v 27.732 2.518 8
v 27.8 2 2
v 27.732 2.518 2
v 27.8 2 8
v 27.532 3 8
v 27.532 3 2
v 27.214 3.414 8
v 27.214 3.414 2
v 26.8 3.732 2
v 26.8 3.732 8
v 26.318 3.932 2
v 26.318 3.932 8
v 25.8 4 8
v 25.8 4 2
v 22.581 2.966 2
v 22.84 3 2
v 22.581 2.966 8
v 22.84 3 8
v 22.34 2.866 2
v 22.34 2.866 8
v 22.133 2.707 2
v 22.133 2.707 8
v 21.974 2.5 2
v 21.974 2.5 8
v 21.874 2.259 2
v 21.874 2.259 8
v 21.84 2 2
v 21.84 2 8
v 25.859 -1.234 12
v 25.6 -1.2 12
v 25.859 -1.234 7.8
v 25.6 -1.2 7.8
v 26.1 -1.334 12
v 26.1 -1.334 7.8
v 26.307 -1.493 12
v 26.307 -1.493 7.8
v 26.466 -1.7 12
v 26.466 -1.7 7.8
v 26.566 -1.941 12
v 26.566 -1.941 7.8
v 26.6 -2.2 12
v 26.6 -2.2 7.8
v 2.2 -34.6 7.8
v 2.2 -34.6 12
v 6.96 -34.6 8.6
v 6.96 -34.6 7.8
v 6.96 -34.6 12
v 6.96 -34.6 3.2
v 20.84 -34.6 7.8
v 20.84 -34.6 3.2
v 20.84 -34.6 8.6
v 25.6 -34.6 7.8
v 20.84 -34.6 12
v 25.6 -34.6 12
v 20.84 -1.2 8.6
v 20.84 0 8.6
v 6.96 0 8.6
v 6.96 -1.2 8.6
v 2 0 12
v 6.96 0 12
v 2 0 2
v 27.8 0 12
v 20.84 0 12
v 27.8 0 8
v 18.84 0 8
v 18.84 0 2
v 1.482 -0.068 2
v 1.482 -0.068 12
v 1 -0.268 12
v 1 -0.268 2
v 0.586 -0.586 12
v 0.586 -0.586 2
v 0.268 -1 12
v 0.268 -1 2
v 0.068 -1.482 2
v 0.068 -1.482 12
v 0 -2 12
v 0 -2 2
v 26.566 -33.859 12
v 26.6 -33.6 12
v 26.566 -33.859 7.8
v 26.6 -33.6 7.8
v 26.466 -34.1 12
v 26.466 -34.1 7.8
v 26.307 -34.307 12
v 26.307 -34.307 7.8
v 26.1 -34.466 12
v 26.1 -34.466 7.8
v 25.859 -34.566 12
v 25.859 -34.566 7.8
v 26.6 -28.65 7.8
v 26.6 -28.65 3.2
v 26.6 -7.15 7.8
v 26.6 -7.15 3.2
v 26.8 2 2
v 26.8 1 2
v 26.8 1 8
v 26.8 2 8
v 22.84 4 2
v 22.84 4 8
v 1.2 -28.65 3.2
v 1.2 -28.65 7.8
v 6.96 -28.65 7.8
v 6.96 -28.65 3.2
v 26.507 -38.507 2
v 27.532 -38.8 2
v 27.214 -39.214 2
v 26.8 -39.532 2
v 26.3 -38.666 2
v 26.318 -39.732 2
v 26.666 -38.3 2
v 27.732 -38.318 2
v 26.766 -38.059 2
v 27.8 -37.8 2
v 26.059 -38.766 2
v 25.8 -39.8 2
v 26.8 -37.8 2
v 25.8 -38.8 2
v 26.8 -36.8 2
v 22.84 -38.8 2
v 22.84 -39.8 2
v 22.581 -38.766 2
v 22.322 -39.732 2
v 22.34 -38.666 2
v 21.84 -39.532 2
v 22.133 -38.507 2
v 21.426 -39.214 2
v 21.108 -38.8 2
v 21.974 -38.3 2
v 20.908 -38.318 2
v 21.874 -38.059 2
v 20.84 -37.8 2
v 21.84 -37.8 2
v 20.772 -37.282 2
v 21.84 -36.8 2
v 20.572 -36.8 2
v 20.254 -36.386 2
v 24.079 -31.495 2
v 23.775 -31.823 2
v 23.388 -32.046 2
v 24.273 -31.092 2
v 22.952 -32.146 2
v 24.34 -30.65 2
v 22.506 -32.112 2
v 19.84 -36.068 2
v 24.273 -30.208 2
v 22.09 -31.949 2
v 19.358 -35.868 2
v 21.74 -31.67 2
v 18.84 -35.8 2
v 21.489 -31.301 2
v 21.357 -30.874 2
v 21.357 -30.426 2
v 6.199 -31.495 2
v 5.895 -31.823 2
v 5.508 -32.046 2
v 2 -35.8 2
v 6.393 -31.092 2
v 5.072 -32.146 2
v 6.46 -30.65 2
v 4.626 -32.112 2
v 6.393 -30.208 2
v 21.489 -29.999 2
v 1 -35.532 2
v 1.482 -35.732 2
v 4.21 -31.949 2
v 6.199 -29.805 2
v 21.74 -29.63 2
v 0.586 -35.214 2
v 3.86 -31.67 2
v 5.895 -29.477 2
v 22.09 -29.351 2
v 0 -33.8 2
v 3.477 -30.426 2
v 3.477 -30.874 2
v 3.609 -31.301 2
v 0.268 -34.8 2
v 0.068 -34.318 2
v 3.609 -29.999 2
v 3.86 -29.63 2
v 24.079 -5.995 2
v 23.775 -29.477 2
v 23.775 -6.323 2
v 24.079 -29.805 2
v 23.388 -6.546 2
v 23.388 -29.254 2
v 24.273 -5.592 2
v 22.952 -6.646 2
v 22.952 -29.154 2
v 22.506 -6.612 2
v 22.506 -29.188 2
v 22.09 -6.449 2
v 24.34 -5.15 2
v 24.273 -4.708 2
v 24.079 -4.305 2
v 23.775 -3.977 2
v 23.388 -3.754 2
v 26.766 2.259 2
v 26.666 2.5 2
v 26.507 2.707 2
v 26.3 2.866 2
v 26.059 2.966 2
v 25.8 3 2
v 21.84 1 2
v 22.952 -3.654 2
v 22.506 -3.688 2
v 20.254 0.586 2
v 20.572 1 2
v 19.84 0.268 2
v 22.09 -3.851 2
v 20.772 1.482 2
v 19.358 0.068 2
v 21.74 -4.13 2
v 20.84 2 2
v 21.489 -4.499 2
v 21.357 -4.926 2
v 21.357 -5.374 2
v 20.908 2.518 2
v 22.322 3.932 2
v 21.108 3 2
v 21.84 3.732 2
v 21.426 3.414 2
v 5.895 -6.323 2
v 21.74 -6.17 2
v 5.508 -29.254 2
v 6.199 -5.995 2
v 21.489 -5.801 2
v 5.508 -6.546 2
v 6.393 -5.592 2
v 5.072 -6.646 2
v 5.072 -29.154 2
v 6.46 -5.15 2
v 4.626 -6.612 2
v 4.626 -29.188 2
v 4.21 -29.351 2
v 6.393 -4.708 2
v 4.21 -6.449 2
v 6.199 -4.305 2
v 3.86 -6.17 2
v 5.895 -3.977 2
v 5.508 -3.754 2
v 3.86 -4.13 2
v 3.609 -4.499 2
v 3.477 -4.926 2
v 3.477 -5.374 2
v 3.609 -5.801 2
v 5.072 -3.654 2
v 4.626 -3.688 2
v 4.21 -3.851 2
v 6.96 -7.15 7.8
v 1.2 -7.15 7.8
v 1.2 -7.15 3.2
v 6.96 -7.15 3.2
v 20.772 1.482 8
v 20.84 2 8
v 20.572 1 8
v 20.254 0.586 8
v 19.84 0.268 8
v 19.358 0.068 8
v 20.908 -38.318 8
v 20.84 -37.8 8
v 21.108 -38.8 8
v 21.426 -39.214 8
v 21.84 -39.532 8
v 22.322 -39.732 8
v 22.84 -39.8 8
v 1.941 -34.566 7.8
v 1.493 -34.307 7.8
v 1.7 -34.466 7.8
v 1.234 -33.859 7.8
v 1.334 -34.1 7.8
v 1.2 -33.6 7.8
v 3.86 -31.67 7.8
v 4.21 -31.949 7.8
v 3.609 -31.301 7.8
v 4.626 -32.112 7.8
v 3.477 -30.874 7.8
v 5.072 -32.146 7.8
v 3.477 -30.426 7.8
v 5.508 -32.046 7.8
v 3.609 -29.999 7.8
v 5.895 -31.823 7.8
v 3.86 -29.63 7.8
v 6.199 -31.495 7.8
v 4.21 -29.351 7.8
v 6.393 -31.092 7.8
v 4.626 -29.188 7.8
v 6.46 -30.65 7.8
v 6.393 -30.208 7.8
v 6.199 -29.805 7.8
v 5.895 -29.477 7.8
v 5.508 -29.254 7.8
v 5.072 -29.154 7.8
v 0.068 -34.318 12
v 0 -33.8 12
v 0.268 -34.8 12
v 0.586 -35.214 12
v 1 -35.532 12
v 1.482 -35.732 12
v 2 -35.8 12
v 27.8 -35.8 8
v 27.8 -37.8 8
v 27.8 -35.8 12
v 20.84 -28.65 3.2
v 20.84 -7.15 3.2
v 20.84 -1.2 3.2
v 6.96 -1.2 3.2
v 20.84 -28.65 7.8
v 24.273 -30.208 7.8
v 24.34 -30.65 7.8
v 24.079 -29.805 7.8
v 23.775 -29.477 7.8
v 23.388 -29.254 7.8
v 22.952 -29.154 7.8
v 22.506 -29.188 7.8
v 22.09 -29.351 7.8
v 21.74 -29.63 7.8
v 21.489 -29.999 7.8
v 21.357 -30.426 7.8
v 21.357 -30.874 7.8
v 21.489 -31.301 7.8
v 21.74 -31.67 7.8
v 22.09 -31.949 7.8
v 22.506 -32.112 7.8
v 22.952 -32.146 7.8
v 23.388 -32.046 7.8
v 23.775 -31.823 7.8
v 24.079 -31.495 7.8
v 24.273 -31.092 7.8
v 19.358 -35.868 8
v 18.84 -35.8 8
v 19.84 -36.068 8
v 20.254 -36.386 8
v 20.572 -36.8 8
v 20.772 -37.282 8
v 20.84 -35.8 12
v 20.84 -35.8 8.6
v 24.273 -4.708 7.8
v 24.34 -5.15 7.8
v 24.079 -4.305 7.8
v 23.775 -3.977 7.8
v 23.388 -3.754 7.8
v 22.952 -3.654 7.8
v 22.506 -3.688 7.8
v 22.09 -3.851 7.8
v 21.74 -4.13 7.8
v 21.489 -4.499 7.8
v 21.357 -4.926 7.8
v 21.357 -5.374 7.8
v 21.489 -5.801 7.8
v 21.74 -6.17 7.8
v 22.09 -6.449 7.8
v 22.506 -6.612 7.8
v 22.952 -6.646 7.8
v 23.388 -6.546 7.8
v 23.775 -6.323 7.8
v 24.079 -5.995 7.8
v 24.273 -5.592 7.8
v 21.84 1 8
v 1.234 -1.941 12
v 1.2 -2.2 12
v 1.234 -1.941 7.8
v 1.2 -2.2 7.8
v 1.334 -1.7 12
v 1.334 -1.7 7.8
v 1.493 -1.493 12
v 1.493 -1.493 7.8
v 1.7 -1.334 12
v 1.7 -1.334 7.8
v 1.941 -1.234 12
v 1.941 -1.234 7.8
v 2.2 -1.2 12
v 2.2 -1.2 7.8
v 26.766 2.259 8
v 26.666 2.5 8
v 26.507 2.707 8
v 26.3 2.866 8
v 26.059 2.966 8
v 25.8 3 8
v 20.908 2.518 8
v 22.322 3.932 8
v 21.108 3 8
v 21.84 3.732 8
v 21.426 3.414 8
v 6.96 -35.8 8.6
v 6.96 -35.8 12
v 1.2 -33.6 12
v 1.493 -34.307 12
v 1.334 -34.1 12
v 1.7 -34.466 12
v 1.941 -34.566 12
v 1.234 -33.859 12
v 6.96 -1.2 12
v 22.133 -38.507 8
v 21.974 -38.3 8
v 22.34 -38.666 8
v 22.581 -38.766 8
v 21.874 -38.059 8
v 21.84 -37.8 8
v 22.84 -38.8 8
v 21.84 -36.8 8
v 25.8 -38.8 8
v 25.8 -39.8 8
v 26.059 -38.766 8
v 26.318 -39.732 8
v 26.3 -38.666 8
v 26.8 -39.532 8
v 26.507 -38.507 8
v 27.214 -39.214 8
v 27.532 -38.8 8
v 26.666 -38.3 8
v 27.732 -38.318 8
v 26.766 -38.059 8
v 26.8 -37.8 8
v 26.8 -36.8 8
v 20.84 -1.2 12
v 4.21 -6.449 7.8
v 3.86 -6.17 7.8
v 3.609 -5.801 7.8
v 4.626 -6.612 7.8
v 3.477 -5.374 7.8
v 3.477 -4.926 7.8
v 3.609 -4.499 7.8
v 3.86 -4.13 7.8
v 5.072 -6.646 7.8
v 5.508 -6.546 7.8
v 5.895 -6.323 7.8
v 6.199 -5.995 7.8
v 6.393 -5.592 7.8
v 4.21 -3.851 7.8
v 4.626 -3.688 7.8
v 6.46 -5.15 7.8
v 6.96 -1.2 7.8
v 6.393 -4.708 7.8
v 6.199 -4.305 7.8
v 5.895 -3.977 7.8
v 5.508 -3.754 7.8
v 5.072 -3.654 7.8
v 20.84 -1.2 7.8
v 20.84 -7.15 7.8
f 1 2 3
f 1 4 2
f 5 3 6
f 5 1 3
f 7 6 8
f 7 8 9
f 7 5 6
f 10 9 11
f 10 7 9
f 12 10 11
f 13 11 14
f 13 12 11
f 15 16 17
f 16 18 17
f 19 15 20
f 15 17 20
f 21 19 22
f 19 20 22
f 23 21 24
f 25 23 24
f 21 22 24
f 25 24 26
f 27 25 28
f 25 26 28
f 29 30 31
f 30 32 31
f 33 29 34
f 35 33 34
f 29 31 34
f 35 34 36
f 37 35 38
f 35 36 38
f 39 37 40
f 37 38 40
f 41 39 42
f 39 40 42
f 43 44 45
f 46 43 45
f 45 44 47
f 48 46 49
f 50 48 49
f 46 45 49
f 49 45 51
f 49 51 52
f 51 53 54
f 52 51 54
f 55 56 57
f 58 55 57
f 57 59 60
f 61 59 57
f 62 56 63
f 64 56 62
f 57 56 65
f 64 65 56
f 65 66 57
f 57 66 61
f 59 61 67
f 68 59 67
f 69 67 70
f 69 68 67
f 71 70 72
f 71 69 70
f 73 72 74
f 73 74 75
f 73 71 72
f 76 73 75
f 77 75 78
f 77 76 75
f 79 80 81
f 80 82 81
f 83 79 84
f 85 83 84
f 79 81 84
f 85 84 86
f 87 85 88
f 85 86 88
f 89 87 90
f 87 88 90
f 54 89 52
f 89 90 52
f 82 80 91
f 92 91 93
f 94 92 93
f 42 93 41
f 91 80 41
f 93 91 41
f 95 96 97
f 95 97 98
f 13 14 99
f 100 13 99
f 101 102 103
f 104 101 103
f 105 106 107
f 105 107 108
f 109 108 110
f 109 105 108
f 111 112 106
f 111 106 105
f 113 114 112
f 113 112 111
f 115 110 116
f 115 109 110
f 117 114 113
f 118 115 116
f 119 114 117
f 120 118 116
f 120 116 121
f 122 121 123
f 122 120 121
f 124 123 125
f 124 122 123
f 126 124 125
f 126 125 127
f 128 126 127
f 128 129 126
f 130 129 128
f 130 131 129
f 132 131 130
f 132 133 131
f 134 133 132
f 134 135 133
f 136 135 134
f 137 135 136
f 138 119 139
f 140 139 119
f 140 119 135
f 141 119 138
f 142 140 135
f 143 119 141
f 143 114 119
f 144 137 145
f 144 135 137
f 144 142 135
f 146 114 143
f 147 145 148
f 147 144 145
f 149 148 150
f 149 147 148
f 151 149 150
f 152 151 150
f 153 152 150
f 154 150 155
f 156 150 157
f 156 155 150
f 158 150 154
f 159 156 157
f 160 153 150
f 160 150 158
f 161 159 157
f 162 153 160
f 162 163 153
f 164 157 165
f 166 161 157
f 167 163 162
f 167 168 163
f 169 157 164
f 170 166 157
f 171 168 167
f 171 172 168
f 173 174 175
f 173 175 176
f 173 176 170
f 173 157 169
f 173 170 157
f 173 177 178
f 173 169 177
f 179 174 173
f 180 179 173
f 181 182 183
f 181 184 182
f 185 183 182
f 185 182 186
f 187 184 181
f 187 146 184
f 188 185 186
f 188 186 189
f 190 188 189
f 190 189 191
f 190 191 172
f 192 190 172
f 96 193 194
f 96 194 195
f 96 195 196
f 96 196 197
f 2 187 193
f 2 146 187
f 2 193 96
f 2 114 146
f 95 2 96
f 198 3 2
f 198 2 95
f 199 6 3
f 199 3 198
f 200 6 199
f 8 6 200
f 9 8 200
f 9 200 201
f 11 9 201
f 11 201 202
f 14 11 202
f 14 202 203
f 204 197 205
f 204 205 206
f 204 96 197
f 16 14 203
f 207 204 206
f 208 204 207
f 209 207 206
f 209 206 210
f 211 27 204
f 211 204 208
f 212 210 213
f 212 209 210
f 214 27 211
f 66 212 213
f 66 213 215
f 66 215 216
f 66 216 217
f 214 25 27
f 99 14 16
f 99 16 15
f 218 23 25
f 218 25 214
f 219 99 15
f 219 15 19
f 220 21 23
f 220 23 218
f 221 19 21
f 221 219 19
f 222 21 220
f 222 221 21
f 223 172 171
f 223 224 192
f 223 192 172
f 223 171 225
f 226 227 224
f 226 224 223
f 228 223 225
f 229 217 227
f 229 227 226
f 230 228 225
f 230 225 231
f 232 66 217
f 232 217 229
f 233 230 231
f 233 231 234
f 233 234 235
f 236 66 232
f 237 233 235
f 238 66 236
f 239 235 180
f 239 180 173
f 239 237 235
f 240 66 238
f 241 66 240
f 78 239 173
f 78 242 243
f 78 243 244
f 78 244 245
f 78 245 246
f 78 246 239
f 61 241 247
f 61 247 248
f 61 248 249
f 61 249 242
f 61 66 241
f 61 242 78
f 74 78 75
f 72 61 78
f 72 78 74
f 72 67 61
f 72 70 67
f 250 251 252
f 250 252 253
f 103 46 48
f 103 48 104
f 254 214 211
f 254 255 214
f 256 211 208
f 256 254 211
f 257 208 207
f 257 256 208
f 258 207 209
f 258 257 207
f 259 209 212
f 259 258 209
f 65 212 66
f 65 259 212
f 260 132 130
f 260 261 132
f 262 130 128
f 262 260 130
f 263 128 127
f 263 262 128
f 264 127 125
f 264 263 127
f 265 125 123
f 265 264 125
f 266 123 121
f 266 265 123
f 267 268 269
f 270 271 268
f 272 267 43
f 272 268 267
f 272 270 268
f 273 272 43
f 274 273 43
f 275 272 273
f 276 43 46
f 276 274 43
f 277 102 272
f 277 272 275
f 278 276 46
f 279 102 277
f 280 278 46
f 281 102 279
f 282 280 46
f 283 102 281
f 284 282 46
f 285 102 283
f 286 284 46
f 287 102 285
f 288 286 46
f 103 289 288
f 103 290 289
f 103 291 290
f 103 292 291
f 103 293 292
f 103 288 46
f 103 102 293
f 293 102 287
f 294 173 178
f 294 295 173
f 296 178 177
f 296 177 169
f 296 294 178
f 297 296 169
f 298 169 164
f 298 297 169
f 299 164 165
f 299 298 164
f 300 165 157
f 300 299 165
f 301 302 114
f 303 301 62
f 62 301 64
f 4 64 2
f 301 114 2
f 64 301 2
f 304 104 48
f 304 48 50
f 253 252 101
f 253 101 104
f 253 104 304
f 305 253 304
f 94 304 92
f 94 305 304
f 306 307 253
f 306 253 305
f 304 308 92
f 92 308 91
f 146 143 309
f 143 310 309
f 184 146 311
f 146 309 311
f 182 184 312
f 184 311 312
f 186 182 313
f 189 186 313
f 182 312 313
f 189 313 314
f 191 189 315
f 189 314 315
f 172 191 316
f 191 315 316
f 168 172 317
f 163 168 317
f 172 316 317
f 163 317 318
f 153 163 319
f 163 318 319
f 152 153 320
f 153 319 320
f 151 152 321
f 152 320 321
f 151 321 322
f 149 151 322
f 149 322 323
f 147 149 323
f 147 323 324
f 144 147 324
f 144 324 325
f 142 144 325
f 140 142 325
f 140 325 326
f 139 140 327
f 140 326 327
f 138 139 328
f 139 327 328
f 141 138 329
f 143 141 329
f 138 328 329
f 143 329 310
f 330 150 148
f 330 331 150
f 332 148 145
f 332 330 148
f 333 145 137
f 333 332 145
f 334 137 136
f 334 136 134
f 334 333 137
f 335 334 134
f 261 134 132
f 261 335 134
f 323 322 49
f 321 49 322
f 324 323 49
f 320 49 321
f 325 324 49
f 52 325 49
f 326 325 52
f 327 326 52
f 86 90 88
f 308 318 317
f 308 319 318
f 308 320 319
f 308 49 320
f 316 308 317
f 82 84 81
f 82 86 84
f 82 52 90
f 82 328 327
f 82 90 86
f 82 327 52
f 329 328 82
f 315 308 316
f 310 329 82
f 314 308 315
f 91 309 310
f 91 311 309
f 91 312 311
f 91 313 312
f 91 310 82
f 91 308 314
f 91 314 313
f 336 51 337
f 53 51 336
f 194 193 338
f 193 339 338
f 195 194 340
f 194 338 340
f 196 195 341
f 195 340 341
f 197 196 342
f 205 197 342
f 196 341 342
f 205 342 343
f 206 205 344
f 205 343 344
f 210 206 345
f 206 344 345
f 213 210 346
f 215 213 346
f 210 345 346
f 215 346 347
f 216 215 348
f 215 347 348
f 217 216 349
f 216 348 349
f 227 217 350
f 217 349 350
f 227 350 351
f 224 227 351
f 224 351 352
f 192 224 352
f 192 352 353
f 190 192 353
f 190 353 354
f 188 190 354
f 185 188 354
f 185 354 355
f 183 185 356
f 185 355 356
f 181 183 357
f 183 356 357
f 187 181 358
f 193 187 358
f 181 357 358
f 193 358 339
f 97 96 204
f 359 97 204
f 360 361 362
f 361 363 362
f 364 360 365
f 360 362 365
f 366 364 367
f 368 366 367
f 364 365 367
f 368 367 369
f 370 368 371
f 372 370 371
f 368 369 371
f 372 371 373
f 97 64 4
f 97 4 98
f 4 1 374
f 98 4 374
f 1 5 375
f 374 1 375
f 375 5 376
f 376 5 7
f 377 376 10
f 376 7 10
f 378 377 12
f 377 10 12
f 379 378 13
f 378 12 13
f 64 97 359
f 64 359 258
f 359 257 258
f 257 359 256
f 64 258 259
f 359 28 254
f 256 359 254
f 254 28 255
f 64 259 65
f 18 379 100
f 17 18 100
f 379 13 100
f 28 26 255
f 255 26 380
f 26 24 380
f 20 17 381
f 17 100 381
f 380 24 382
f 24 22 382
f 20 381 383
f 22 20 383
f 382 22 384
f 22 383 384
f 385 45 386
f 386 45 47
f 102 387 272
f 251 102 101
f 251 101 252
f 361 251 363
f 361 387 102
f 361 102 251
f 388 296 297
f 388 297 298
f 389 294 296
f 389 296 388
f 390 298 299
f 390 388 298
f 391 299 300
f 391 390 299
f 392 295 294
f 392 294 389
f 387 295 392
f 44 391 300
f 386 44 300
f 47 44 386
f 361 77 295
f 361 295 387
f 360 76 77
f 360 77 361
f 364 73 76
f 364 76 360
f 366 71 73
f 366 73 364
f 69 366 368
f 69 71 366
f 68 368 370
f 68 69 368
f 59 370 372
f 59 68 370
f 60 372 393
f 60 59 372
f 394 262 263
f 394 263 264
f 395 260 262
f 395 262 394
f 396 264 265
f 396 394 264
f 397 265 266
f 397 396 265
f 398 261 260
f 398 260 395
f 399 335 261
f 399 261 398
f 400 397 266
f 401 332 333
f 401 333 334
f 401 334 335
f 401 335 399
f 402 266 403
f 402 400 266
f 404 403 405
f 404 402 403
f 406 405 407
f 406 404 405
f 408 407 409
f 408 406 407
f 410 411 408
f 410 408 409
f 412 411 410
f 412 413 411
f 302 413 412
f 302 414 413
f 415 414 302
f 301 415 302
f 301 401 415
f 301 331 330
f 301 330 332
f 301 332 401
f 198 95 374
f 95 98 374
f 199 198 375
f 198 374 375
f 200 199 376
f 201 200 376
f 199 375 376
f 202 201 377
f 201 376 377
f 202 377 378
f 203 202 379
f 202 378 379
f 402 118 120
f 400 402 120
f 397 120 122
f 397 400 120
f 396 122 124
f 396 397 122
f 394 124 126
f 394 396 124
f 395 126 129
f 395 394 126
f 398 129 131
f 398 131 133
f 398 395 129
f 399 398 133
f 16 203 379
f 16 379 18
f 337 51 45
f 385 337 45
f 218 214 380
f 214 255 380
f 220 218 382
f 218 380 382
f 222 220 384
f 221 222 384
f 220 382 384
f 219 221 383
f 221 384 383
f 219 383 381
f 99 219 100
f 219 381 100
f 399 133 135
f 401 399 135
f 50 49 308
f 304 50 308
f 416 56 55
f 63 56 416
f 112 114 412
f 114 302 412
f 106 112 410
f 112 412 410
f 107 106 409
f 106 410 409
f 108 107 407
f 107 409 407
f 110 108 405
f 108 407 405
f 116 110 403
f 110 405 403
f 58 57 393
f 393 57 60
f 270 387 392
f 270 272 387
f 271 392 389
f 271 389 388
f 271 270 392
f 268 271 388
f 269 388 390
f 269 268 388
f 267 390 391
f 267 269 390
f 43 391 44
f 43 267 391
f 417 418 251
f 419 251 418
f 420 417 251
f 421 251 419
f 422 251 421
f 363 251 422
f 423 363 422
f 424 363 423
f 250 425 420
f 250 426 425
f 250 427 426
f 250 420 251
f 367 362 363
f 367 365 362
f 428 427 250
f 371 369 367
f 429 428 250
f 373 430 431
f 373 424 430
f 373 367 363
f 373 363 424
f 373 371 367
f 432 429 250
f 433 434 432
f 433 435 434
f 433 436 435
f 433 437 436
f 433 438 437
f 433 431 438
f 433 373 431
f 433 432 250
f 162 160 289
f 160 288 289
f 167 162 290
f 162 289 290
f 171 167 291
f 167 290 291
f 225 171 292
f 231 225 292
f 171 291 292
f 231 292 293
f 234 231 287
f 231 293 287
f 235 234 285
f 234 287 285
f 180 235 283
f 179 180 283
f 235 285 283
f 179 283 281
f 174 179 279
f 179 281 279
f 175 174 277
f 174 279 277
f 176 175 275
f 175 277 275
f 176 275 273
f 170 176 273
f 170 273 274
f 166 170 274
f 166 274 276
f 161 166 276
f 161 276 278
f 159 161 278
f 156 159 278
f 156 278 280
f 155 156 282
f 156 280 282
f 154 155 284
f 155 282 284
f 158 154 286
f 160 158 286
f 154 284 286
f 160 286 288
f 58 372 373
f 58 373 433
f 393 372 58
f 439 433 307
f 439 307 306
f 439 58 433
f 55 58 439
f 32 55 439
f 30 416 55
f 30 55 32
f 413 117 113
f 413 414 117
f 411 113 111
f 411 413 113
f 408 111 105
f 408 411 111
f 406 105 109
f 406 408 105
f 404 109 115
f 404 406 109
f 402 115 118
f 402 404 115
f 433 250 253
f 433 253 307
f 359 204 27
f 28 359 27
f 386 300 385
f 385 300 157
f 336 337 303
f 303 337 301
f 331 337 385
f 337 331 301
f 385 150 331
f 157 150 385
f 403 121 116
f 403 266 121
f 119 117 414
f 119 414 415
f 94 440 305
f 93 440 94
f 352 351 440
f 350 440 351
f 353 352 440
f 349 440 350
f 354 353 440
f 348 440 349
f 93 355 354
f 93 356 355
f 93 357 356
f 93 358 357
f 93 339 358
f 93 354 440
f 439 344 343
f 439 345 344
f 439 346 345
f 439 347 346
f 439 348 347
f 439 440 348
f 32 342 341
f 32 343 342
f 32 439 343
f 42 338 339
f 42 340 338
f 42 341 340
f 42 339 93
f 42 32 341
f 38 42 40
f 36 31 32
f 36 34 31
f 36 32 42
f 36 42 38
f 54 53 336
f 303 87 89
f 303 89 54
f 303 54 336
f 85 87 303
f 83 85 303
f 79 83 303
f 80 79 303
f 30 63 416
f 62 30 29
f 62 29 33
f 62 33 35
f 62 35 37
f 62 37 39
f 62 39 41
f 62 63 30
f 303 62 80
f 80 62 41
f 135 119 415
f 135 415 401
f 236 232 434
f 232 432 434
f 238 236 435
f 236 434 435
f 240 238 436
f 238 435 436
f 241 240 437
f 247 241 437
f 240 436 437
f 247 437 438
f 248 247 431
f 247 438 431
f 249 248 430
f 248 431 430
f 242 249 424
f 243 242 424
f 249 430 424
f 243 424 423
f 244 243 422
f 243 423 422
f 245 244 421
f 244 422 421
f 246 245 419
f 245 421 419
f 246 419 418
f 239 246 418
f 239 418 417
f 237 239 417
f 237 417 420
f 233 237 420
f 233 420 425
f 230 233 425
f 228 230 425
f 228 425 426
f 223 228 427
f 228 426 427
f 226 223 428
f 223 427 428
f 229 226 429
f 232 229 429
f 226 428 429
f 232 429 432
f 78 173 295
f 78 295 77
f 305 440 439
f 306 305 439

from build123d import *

# Parameters (mm, degrees)
SKIZZE1_W         = 27.8
SKIZZE1_H         = 35.8
EXTRUSION1_DEPTH  = 12
SKIZZE2_W         = 25.4
SKIZZE2_H         = 33.4
EXTRUSION2_DEPTH  = 10.8
SKIZZE3_R         = 1.5
EXTRUSION3_DEPTH  = 10.8
EXTRUSION4_START  = 6.6
SKIZZE4_W         = 5.76
SKIZZE4_H         = 5.95
SKIZZE4_R         = 1.5
EXTRUSION4_DEPTH  = 6.6
SKIZZE5_W         = 13.88
SKIZZE5_H         = 3.4
EXTRUSION5_DEPTH  = 47.887951544
EXTRUSION6_DEPTH  = 2
SKIZZE7_W         = 27.8
SKIZZE7_H         = 35.8
EXTRUSION7_DEPTH  = 2
SKIZZE8_W         = 6.96
SKIZZE8_H         = 6
EXTRUSION8_DEPTH  = 4
SKIZZE9_W         = 4.96
SKIZZE9_H         = 2
EXTRUSION9_DEPTH  = 50.566924456
SKIZZE10_W        = 6.96
SKIZZE10_H        = 4
SKIZZE10_W_2      = 4.96
SKIZZE10_H_2      = 2
EXTRUSION10_DEPTH = 6
RUNDUNG1_R        = 2
RUNDUNG2_R        = 1
RUNDUNG3_R        = 1
SKIZZE11_R        = 1.5
EXTRUSION11_DEPTH = 10


with BuildPart() as part:
    # Skizze1 → Extrusion1 (new body)
    with BuildSketch(Plane.XY):
        with Locations((13.9, -17.9)):
            Rectangle(SKIZZE1_W, SKIZZE1_H)
    extrude(amount=EXTRUSION1_DEPTH)

    # Skizze2 → Extrusion2 (cut)
    with BuildSketch(Plane.XY.offset(12)):
        with Locations((13.9, -17.9)):
            Rectangle(SKIZZE2_W, SKIZZE2_H)
    extrude(amount=-EXTRUSION2_DEPTH, mode=Mode.SUBTRACT)

    # Skizze3 → Extrusion3 (cut)
    with BuildSketch(Plane.XY.offset(1.2)):
        with Locations((22.84, -30.65)):
            Circle(SKIZZE3_R)
        with Locations((4.96, -30.65)):
            Circle(SKIZZE3_R)
        with Locations((22.84, -5.15)):
            Circle(SKIZZE3_R)
        with Locations((4.96, -5.15)):
            Circle(SKIZZE3_R)
    extrude(amount=-EXTRUSION3_DEPTH, mode=Mode.SUBTRACT)

    # Skizze4 → Extrusion4 (add)
    # profile 1 of 4: a face of its own
    with BuildSketch(Plane.XY.offset(1.2).offset(EXTRUSION4_START)):
        with Locations((4.08, -4.175)):
            Rectangle(SKIZZE4_W, SKIZZE4_H)
        with Locations((4.96, -5.15)):
            Circle(SKIZZE4_R, mode=Mode.SUBTRACT)
    # profile 2 of 4: a face of its own
    with BuildSketch(Plane.XY.offset(1.2).offset(EXTRUSION4_START)):
        with Locations((23.72, -4.175)):
            Rectangle(SKIZZE4_W, SKIZZE4_H)
        with Locations((22.84, -5.15)):
            Circle(SKIZZE4_R, mode=Mode.SUBTRACT)
    # profile 3 of 4: a face of its own
    with BuildSketch(Plane.XY.offset(1.2).offset(EXTRUSION4_START)):
        with Locations((23.72, -31.625)):
            Rectangle(SKIZZE4_W, SKIZZE4_H)
        with Locations((22.84, -30.65)):
            Circle(SKIZZE4_R, mode=Mode.SUBTRACT)
    # profile 4 of 4: a face of its own
    with BuildSketch(Plane.XY.offset(1.2).offset(EXTRUSION4_START)):
        with Locations((4.08, -31.625)):
            Rectangle(SKIZZE4_W, SKIZZE4_H)
        with Locations((4.96, -30.65)):
            Circle(SKIZZE4_R, mode=Mode.SUBTRACT)
    extrude(amount=-EXTRUSION4_DEPTH)

    # Skizze5 → Extrusion5 (cut, through all)
    with BuildSketch(Plane(origin=(0, 0, 0), x_dir=(-1, 0, 0), z_dir=(0, 1, 0))):
        with Locations((-13.9, 10.3)):
            Rectangle(SKIZZE5_W, SKIZZE5_H)
    extrude(amount=-EXTRUSION5_DEPTH, mode=Mode.SUBTRACT)

    # Skizze6 → Extrusion6 (add)
    with BuildSketch(Plane.XY.offset(1.2)):
        Polygon((26.6, -1.2), (1.2, -1.2), (1.2, -34.6), (20.84, -34.6), (26.6, -34.6), align=None)
    extrude(amount=EXTRUSION6_DEPTH)

    # Skizze7 → Extrusion7 (cut)
    with BuildSketch(Plane(origin=(0, 0, 0), x_dir=(-1, 0, 0), z_dir=(0, 0, -1))):
        with Locations((-13.9, -17.9)):
            Rectangle(SKIZZE7_W, SKIZZE7_H)
    extrude(amount=-EXTRUSION7_DEPTH, mode=Mode.SUBTRACT)

    # Skizze8 → Extrusion8 (add)
    with BuildSketch(Plane.XZ.offset(35.8)):
        with Locations((24.32, 5)):
            Rectangle(SKIZZE8_W, SKIZZE8_H)
    extrude(amount=EXTRUSION8_DEPTH)

    # Skizze9 → Extrusion9 (cut, through all)
    with BuildSketch(Plane(origin=(0, 0, 2), x_dir=(-1, 0, 0), z_dir=(0, 0, -1))):
        with Locations((-24.32, -37.8)):
            Rectangle(SKIZZE9_W, SKIZZE9_H)
    extrude(amount=-EXTRUSION9_DEPTH, mode=Mode.SUBTRACT)

    # Skizze10 → Extrusion10 (add)
    with BuildSketch(Plane(origin=(0, 0, 2), x_dir=(-1, 0, 0), z_dir=(0, 0, -1))):
        with Locations((-24.32, 2)):
            Rectangle(SKIZZE10_W, SKIZZE10_H)
        with Locations((-24.32, 2)):
            Rectangle(SKIZZE10_W_2, SKIZZE10_H_2, mode=Mode.SUBTRACT)
    extrude(amount=-EXTRUSION10_DEPTH)

    # Rundung1
    rundung1_edges = [part.edges().sort_by_distance(p)[0] for p in [
        (0, 0, 7),
        (0, -35.8, 7),
        (20.84, -39.8, 5),
        (27.8, -39.8, 5),
        (20.84, 4, 5),
        (27.8, 4, 5),
        (20.84, -35.8, 5),
        (20.84, 0, 5),
    ]]
    fillet(rundung1_edges, radius=RUNDUNG1_R - 0.0001)  # a hair under: the kernel refuses the full size

    # Rundung2
    rundung2_edges = [part.edges().sort_by_distance(p)[0] for p in [
        (1.2, -1.2, 9.9),
        (26.6, -1.2, 9.9),
        (26.6, -34.6, 9.9),
        (1.2, -34.6, 9.9),
    ]]
    fillet(rundung2_edges, radius=RUNDUNG2_R)

    # Rundung3
    rundung3_edges = [part.edges().sort_by_distance(p)[0] for p in [
        (26.8, -38.8, 5),
        (21.84, -38.8, 5),
        (21.84, 3, 5),
        (26.8, 3, 5),
    ]]
    fillet(rundung3_edges, radius=RUNDUNG3_R)

    # Skizze11 → Extrusion11 (cut)
    with BuildSketch(Plane.XY.offset(7.8)):
        with Locations((4.96, -5.15)):
            Circle(SKIZZE11_R)
        with Locations((22.84, -5.15)):
            Circle(SKIZZE11_R)
        with Locations((4.96, -30.65)):
            Circle(SKIZZE11_R)
        with Locations((22.84, -30.65)):
            Circle(SKIZZE11_R)
    extrude(amount=-EXTRUSION11_DEPTH, mode=Mode.SUBTRACT)


solid = part.part
